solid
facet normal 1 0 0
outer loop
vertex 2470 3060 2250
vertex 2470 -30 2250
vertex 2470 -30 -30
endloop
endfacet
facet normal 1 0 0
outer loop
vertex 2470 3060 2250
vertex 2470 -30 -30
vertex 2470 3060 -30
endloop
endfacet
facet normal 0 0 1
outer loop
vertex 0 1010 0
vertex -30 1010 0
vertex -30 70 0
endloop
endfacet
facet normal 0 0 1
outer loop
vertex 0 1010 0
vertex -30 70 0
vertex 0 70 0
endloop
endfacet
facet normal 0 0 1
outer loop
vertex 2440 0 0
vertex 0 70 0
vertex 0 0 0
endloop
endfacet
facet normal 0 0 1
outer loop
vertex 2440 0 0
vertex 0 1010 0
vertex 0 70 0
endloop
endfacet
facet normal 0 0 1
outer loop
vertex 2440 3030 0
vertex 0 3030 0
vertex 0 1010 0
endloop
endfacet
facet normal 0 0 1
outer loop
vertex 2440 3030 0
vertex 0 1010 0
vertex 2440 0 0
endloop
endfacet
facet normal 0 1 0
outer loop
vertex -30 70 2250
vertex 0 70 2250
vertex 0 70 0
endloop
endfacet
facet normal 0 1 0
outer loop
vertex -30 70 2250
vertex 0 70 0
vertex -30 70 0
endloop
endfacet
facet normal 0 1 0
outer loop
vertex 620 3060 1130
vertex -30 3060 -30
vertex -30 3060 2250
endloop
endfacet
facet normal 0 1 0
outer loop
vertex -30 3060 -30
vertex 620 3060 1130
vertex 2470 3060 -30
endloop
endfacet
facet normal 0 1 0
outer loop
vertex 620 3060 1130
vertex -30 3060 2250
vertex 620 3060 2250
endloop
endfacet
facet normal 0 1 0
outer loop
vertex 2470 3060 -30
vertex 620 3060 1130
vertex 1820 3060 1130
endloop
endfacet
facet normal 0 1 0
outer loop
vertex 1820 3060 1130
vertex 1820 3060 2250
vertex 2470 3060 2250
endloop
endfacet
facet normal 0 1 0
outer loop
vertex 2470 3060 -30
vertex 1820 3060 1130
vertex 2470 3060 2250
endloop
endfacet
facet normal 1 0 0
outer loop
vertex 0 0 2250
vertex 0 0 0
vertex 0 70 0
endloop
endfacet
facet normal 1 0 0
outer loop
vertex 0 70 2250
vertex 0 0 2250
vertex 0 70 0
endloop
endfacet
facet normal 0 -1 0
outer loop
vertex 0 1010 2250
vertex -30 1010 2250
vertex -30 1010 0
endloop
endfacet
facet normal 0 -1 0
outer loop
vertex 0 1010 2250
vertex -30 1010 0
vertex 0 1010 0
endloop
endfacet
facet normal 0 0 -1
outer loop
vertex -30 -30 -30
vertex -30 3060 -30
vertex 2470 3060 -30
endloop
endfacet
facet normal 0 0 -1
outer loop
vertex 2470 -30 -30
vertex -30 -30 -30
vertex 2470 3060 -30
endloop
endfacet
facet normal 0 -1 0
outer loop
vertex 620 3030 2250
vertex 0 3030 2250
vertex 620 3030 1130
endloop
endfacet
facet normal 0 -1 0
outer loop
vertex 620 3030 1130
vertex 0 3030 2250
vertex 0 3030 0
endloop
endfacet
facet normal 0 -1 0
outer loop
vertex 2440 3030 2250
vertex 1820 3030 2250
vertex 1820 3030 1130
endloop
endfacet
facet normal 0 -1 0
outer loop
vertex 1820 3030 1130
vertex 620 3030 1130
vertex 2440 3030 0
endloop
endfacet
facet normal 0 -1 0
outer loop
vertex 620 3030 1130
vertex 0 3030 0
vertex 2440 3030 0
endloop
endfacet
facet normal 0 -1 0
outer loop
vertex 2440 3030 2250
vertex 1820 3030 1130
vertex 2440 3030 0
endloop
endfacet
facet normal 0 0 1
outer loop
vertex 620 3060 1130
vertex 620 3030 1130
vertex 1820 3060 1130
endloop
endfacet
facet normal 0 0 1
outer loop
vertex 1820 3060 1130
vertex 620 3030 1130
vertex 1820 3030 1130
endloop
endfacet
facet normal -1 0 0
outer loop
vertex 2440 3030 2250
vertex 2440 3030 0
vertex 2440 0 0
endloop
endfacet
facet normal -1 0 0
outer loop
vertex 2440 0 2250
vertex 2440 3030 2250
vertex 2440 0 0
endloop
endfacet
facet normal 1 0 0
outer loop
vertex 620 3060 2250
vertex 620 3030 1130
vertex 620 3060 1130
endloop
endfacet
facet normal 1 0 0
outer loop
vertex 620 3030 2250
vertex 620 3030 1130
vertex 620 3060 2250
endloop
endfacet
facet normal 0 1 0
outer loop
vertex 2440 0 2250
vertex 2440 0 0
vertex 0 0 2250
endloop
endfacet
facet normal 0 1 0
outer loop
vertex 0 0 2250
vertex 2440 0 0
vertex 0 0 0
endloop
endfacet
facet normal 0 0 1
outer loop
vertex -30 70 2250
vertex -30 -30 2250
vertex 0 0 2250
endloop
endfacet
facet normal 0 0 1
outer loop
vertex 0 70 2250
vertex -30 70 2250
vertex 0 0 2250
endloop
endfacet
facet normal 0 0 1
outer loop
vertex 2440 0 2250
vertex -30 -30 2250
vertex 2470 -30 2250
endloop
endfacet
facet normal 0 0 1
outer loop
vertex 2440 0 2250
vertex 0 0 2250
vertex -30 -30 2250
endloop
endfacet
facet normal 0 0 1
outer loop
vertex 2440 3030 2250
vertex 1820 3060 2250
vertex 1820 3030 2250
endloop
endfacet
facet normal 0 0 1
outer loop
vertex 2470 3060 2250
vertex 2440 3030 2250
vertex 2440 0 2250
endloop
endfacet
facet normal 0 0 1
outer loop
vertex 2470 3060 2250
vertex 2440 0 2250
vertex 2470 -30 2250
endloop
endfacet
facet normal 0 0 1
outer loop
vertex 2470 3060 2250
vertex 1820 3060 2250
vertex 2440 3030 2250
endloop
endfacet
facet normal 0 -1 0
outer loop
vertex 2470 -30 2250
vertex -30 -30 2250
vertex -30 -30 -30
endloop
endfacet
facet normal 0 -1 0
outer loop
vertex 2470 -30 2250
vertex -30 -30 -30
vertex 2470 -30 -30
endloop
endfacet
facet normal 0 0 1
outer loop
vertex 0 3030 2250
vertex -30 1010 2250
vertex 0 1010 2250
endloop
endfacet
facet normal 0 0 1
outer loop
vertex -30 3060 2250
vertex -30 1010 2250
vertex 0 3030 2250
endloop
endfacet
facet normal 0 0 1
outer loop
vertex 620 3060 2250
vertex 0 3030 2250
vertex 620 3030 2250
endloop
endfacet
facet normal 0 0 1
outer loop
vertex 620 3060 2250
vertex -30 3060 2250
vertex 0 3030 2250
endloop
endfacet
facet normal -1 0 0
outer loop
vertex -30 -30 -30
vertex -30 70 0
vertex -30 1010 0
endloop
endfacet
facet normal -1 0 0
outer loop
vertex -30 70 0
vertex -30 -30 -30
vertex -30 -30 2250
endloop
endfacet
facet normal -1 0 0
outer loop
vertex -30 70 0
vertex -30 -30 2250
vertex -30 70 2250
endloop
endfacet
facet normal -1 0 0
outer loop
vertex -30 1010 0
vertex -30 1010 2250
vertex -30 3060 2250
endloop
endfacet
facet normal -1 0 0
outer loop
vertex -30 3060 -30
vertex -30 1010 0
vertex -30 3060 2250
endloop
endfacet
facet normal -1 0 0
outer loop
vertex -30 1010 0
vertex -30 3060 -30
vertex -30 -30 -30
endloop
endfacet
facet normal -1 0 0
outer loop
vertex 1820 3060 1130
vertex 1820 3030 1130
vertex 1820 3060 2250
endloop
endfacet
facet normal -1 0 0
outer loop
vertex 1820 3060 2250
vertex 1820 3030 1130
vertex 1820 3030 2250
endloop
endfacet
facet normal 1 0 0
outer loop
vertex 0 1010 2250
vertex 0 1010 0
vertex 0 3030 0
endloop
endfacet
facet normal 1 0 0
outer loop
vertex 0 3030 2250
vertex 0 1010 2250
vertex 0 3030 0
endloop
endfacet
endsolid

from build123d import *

# Parameters (mm, degrees)
F1_DEPTH = 2250
F2_W     = 2500
F2_H     = 3090
F3_DEPTH = 30
F4_W     = 1200
F4_H     = 1120
F5_DEPTH = 30


with BuildPart() as f1:
    # F0 (on Top) → F1 (new body)
    with BuildSketch(Plane.XY):
        Polygon((0, 1010), (0, 3030), (2440, 3030), (2440, 0), (0, 0), (0, 70), (-30, 70), (-30, -30), (2470, -30), (2470, 3060), (-30, 3060), (-30, 1010), align=None)
    extrude(amount=F1_DEPTH)

    # F2 (on Top) → F3 (join)
    with BuildSketch(Plane.XY):
        with Locations((1220, 1515)):
            Rectangle(F2_W, F2_H)
    extrude(amount=-F3_DEPTH)

    # F4 (on face) → F5 (cut, through all)
    with BuildSketch(Plane.XZ.offset(-3030)):
        with Locations((1220, 1690)):
            Rectangle(F4_W, F4_H)
    extrude(amount=-F5_DEPTH, mode=Mode.SUBTRACT)


solid = f1.part
